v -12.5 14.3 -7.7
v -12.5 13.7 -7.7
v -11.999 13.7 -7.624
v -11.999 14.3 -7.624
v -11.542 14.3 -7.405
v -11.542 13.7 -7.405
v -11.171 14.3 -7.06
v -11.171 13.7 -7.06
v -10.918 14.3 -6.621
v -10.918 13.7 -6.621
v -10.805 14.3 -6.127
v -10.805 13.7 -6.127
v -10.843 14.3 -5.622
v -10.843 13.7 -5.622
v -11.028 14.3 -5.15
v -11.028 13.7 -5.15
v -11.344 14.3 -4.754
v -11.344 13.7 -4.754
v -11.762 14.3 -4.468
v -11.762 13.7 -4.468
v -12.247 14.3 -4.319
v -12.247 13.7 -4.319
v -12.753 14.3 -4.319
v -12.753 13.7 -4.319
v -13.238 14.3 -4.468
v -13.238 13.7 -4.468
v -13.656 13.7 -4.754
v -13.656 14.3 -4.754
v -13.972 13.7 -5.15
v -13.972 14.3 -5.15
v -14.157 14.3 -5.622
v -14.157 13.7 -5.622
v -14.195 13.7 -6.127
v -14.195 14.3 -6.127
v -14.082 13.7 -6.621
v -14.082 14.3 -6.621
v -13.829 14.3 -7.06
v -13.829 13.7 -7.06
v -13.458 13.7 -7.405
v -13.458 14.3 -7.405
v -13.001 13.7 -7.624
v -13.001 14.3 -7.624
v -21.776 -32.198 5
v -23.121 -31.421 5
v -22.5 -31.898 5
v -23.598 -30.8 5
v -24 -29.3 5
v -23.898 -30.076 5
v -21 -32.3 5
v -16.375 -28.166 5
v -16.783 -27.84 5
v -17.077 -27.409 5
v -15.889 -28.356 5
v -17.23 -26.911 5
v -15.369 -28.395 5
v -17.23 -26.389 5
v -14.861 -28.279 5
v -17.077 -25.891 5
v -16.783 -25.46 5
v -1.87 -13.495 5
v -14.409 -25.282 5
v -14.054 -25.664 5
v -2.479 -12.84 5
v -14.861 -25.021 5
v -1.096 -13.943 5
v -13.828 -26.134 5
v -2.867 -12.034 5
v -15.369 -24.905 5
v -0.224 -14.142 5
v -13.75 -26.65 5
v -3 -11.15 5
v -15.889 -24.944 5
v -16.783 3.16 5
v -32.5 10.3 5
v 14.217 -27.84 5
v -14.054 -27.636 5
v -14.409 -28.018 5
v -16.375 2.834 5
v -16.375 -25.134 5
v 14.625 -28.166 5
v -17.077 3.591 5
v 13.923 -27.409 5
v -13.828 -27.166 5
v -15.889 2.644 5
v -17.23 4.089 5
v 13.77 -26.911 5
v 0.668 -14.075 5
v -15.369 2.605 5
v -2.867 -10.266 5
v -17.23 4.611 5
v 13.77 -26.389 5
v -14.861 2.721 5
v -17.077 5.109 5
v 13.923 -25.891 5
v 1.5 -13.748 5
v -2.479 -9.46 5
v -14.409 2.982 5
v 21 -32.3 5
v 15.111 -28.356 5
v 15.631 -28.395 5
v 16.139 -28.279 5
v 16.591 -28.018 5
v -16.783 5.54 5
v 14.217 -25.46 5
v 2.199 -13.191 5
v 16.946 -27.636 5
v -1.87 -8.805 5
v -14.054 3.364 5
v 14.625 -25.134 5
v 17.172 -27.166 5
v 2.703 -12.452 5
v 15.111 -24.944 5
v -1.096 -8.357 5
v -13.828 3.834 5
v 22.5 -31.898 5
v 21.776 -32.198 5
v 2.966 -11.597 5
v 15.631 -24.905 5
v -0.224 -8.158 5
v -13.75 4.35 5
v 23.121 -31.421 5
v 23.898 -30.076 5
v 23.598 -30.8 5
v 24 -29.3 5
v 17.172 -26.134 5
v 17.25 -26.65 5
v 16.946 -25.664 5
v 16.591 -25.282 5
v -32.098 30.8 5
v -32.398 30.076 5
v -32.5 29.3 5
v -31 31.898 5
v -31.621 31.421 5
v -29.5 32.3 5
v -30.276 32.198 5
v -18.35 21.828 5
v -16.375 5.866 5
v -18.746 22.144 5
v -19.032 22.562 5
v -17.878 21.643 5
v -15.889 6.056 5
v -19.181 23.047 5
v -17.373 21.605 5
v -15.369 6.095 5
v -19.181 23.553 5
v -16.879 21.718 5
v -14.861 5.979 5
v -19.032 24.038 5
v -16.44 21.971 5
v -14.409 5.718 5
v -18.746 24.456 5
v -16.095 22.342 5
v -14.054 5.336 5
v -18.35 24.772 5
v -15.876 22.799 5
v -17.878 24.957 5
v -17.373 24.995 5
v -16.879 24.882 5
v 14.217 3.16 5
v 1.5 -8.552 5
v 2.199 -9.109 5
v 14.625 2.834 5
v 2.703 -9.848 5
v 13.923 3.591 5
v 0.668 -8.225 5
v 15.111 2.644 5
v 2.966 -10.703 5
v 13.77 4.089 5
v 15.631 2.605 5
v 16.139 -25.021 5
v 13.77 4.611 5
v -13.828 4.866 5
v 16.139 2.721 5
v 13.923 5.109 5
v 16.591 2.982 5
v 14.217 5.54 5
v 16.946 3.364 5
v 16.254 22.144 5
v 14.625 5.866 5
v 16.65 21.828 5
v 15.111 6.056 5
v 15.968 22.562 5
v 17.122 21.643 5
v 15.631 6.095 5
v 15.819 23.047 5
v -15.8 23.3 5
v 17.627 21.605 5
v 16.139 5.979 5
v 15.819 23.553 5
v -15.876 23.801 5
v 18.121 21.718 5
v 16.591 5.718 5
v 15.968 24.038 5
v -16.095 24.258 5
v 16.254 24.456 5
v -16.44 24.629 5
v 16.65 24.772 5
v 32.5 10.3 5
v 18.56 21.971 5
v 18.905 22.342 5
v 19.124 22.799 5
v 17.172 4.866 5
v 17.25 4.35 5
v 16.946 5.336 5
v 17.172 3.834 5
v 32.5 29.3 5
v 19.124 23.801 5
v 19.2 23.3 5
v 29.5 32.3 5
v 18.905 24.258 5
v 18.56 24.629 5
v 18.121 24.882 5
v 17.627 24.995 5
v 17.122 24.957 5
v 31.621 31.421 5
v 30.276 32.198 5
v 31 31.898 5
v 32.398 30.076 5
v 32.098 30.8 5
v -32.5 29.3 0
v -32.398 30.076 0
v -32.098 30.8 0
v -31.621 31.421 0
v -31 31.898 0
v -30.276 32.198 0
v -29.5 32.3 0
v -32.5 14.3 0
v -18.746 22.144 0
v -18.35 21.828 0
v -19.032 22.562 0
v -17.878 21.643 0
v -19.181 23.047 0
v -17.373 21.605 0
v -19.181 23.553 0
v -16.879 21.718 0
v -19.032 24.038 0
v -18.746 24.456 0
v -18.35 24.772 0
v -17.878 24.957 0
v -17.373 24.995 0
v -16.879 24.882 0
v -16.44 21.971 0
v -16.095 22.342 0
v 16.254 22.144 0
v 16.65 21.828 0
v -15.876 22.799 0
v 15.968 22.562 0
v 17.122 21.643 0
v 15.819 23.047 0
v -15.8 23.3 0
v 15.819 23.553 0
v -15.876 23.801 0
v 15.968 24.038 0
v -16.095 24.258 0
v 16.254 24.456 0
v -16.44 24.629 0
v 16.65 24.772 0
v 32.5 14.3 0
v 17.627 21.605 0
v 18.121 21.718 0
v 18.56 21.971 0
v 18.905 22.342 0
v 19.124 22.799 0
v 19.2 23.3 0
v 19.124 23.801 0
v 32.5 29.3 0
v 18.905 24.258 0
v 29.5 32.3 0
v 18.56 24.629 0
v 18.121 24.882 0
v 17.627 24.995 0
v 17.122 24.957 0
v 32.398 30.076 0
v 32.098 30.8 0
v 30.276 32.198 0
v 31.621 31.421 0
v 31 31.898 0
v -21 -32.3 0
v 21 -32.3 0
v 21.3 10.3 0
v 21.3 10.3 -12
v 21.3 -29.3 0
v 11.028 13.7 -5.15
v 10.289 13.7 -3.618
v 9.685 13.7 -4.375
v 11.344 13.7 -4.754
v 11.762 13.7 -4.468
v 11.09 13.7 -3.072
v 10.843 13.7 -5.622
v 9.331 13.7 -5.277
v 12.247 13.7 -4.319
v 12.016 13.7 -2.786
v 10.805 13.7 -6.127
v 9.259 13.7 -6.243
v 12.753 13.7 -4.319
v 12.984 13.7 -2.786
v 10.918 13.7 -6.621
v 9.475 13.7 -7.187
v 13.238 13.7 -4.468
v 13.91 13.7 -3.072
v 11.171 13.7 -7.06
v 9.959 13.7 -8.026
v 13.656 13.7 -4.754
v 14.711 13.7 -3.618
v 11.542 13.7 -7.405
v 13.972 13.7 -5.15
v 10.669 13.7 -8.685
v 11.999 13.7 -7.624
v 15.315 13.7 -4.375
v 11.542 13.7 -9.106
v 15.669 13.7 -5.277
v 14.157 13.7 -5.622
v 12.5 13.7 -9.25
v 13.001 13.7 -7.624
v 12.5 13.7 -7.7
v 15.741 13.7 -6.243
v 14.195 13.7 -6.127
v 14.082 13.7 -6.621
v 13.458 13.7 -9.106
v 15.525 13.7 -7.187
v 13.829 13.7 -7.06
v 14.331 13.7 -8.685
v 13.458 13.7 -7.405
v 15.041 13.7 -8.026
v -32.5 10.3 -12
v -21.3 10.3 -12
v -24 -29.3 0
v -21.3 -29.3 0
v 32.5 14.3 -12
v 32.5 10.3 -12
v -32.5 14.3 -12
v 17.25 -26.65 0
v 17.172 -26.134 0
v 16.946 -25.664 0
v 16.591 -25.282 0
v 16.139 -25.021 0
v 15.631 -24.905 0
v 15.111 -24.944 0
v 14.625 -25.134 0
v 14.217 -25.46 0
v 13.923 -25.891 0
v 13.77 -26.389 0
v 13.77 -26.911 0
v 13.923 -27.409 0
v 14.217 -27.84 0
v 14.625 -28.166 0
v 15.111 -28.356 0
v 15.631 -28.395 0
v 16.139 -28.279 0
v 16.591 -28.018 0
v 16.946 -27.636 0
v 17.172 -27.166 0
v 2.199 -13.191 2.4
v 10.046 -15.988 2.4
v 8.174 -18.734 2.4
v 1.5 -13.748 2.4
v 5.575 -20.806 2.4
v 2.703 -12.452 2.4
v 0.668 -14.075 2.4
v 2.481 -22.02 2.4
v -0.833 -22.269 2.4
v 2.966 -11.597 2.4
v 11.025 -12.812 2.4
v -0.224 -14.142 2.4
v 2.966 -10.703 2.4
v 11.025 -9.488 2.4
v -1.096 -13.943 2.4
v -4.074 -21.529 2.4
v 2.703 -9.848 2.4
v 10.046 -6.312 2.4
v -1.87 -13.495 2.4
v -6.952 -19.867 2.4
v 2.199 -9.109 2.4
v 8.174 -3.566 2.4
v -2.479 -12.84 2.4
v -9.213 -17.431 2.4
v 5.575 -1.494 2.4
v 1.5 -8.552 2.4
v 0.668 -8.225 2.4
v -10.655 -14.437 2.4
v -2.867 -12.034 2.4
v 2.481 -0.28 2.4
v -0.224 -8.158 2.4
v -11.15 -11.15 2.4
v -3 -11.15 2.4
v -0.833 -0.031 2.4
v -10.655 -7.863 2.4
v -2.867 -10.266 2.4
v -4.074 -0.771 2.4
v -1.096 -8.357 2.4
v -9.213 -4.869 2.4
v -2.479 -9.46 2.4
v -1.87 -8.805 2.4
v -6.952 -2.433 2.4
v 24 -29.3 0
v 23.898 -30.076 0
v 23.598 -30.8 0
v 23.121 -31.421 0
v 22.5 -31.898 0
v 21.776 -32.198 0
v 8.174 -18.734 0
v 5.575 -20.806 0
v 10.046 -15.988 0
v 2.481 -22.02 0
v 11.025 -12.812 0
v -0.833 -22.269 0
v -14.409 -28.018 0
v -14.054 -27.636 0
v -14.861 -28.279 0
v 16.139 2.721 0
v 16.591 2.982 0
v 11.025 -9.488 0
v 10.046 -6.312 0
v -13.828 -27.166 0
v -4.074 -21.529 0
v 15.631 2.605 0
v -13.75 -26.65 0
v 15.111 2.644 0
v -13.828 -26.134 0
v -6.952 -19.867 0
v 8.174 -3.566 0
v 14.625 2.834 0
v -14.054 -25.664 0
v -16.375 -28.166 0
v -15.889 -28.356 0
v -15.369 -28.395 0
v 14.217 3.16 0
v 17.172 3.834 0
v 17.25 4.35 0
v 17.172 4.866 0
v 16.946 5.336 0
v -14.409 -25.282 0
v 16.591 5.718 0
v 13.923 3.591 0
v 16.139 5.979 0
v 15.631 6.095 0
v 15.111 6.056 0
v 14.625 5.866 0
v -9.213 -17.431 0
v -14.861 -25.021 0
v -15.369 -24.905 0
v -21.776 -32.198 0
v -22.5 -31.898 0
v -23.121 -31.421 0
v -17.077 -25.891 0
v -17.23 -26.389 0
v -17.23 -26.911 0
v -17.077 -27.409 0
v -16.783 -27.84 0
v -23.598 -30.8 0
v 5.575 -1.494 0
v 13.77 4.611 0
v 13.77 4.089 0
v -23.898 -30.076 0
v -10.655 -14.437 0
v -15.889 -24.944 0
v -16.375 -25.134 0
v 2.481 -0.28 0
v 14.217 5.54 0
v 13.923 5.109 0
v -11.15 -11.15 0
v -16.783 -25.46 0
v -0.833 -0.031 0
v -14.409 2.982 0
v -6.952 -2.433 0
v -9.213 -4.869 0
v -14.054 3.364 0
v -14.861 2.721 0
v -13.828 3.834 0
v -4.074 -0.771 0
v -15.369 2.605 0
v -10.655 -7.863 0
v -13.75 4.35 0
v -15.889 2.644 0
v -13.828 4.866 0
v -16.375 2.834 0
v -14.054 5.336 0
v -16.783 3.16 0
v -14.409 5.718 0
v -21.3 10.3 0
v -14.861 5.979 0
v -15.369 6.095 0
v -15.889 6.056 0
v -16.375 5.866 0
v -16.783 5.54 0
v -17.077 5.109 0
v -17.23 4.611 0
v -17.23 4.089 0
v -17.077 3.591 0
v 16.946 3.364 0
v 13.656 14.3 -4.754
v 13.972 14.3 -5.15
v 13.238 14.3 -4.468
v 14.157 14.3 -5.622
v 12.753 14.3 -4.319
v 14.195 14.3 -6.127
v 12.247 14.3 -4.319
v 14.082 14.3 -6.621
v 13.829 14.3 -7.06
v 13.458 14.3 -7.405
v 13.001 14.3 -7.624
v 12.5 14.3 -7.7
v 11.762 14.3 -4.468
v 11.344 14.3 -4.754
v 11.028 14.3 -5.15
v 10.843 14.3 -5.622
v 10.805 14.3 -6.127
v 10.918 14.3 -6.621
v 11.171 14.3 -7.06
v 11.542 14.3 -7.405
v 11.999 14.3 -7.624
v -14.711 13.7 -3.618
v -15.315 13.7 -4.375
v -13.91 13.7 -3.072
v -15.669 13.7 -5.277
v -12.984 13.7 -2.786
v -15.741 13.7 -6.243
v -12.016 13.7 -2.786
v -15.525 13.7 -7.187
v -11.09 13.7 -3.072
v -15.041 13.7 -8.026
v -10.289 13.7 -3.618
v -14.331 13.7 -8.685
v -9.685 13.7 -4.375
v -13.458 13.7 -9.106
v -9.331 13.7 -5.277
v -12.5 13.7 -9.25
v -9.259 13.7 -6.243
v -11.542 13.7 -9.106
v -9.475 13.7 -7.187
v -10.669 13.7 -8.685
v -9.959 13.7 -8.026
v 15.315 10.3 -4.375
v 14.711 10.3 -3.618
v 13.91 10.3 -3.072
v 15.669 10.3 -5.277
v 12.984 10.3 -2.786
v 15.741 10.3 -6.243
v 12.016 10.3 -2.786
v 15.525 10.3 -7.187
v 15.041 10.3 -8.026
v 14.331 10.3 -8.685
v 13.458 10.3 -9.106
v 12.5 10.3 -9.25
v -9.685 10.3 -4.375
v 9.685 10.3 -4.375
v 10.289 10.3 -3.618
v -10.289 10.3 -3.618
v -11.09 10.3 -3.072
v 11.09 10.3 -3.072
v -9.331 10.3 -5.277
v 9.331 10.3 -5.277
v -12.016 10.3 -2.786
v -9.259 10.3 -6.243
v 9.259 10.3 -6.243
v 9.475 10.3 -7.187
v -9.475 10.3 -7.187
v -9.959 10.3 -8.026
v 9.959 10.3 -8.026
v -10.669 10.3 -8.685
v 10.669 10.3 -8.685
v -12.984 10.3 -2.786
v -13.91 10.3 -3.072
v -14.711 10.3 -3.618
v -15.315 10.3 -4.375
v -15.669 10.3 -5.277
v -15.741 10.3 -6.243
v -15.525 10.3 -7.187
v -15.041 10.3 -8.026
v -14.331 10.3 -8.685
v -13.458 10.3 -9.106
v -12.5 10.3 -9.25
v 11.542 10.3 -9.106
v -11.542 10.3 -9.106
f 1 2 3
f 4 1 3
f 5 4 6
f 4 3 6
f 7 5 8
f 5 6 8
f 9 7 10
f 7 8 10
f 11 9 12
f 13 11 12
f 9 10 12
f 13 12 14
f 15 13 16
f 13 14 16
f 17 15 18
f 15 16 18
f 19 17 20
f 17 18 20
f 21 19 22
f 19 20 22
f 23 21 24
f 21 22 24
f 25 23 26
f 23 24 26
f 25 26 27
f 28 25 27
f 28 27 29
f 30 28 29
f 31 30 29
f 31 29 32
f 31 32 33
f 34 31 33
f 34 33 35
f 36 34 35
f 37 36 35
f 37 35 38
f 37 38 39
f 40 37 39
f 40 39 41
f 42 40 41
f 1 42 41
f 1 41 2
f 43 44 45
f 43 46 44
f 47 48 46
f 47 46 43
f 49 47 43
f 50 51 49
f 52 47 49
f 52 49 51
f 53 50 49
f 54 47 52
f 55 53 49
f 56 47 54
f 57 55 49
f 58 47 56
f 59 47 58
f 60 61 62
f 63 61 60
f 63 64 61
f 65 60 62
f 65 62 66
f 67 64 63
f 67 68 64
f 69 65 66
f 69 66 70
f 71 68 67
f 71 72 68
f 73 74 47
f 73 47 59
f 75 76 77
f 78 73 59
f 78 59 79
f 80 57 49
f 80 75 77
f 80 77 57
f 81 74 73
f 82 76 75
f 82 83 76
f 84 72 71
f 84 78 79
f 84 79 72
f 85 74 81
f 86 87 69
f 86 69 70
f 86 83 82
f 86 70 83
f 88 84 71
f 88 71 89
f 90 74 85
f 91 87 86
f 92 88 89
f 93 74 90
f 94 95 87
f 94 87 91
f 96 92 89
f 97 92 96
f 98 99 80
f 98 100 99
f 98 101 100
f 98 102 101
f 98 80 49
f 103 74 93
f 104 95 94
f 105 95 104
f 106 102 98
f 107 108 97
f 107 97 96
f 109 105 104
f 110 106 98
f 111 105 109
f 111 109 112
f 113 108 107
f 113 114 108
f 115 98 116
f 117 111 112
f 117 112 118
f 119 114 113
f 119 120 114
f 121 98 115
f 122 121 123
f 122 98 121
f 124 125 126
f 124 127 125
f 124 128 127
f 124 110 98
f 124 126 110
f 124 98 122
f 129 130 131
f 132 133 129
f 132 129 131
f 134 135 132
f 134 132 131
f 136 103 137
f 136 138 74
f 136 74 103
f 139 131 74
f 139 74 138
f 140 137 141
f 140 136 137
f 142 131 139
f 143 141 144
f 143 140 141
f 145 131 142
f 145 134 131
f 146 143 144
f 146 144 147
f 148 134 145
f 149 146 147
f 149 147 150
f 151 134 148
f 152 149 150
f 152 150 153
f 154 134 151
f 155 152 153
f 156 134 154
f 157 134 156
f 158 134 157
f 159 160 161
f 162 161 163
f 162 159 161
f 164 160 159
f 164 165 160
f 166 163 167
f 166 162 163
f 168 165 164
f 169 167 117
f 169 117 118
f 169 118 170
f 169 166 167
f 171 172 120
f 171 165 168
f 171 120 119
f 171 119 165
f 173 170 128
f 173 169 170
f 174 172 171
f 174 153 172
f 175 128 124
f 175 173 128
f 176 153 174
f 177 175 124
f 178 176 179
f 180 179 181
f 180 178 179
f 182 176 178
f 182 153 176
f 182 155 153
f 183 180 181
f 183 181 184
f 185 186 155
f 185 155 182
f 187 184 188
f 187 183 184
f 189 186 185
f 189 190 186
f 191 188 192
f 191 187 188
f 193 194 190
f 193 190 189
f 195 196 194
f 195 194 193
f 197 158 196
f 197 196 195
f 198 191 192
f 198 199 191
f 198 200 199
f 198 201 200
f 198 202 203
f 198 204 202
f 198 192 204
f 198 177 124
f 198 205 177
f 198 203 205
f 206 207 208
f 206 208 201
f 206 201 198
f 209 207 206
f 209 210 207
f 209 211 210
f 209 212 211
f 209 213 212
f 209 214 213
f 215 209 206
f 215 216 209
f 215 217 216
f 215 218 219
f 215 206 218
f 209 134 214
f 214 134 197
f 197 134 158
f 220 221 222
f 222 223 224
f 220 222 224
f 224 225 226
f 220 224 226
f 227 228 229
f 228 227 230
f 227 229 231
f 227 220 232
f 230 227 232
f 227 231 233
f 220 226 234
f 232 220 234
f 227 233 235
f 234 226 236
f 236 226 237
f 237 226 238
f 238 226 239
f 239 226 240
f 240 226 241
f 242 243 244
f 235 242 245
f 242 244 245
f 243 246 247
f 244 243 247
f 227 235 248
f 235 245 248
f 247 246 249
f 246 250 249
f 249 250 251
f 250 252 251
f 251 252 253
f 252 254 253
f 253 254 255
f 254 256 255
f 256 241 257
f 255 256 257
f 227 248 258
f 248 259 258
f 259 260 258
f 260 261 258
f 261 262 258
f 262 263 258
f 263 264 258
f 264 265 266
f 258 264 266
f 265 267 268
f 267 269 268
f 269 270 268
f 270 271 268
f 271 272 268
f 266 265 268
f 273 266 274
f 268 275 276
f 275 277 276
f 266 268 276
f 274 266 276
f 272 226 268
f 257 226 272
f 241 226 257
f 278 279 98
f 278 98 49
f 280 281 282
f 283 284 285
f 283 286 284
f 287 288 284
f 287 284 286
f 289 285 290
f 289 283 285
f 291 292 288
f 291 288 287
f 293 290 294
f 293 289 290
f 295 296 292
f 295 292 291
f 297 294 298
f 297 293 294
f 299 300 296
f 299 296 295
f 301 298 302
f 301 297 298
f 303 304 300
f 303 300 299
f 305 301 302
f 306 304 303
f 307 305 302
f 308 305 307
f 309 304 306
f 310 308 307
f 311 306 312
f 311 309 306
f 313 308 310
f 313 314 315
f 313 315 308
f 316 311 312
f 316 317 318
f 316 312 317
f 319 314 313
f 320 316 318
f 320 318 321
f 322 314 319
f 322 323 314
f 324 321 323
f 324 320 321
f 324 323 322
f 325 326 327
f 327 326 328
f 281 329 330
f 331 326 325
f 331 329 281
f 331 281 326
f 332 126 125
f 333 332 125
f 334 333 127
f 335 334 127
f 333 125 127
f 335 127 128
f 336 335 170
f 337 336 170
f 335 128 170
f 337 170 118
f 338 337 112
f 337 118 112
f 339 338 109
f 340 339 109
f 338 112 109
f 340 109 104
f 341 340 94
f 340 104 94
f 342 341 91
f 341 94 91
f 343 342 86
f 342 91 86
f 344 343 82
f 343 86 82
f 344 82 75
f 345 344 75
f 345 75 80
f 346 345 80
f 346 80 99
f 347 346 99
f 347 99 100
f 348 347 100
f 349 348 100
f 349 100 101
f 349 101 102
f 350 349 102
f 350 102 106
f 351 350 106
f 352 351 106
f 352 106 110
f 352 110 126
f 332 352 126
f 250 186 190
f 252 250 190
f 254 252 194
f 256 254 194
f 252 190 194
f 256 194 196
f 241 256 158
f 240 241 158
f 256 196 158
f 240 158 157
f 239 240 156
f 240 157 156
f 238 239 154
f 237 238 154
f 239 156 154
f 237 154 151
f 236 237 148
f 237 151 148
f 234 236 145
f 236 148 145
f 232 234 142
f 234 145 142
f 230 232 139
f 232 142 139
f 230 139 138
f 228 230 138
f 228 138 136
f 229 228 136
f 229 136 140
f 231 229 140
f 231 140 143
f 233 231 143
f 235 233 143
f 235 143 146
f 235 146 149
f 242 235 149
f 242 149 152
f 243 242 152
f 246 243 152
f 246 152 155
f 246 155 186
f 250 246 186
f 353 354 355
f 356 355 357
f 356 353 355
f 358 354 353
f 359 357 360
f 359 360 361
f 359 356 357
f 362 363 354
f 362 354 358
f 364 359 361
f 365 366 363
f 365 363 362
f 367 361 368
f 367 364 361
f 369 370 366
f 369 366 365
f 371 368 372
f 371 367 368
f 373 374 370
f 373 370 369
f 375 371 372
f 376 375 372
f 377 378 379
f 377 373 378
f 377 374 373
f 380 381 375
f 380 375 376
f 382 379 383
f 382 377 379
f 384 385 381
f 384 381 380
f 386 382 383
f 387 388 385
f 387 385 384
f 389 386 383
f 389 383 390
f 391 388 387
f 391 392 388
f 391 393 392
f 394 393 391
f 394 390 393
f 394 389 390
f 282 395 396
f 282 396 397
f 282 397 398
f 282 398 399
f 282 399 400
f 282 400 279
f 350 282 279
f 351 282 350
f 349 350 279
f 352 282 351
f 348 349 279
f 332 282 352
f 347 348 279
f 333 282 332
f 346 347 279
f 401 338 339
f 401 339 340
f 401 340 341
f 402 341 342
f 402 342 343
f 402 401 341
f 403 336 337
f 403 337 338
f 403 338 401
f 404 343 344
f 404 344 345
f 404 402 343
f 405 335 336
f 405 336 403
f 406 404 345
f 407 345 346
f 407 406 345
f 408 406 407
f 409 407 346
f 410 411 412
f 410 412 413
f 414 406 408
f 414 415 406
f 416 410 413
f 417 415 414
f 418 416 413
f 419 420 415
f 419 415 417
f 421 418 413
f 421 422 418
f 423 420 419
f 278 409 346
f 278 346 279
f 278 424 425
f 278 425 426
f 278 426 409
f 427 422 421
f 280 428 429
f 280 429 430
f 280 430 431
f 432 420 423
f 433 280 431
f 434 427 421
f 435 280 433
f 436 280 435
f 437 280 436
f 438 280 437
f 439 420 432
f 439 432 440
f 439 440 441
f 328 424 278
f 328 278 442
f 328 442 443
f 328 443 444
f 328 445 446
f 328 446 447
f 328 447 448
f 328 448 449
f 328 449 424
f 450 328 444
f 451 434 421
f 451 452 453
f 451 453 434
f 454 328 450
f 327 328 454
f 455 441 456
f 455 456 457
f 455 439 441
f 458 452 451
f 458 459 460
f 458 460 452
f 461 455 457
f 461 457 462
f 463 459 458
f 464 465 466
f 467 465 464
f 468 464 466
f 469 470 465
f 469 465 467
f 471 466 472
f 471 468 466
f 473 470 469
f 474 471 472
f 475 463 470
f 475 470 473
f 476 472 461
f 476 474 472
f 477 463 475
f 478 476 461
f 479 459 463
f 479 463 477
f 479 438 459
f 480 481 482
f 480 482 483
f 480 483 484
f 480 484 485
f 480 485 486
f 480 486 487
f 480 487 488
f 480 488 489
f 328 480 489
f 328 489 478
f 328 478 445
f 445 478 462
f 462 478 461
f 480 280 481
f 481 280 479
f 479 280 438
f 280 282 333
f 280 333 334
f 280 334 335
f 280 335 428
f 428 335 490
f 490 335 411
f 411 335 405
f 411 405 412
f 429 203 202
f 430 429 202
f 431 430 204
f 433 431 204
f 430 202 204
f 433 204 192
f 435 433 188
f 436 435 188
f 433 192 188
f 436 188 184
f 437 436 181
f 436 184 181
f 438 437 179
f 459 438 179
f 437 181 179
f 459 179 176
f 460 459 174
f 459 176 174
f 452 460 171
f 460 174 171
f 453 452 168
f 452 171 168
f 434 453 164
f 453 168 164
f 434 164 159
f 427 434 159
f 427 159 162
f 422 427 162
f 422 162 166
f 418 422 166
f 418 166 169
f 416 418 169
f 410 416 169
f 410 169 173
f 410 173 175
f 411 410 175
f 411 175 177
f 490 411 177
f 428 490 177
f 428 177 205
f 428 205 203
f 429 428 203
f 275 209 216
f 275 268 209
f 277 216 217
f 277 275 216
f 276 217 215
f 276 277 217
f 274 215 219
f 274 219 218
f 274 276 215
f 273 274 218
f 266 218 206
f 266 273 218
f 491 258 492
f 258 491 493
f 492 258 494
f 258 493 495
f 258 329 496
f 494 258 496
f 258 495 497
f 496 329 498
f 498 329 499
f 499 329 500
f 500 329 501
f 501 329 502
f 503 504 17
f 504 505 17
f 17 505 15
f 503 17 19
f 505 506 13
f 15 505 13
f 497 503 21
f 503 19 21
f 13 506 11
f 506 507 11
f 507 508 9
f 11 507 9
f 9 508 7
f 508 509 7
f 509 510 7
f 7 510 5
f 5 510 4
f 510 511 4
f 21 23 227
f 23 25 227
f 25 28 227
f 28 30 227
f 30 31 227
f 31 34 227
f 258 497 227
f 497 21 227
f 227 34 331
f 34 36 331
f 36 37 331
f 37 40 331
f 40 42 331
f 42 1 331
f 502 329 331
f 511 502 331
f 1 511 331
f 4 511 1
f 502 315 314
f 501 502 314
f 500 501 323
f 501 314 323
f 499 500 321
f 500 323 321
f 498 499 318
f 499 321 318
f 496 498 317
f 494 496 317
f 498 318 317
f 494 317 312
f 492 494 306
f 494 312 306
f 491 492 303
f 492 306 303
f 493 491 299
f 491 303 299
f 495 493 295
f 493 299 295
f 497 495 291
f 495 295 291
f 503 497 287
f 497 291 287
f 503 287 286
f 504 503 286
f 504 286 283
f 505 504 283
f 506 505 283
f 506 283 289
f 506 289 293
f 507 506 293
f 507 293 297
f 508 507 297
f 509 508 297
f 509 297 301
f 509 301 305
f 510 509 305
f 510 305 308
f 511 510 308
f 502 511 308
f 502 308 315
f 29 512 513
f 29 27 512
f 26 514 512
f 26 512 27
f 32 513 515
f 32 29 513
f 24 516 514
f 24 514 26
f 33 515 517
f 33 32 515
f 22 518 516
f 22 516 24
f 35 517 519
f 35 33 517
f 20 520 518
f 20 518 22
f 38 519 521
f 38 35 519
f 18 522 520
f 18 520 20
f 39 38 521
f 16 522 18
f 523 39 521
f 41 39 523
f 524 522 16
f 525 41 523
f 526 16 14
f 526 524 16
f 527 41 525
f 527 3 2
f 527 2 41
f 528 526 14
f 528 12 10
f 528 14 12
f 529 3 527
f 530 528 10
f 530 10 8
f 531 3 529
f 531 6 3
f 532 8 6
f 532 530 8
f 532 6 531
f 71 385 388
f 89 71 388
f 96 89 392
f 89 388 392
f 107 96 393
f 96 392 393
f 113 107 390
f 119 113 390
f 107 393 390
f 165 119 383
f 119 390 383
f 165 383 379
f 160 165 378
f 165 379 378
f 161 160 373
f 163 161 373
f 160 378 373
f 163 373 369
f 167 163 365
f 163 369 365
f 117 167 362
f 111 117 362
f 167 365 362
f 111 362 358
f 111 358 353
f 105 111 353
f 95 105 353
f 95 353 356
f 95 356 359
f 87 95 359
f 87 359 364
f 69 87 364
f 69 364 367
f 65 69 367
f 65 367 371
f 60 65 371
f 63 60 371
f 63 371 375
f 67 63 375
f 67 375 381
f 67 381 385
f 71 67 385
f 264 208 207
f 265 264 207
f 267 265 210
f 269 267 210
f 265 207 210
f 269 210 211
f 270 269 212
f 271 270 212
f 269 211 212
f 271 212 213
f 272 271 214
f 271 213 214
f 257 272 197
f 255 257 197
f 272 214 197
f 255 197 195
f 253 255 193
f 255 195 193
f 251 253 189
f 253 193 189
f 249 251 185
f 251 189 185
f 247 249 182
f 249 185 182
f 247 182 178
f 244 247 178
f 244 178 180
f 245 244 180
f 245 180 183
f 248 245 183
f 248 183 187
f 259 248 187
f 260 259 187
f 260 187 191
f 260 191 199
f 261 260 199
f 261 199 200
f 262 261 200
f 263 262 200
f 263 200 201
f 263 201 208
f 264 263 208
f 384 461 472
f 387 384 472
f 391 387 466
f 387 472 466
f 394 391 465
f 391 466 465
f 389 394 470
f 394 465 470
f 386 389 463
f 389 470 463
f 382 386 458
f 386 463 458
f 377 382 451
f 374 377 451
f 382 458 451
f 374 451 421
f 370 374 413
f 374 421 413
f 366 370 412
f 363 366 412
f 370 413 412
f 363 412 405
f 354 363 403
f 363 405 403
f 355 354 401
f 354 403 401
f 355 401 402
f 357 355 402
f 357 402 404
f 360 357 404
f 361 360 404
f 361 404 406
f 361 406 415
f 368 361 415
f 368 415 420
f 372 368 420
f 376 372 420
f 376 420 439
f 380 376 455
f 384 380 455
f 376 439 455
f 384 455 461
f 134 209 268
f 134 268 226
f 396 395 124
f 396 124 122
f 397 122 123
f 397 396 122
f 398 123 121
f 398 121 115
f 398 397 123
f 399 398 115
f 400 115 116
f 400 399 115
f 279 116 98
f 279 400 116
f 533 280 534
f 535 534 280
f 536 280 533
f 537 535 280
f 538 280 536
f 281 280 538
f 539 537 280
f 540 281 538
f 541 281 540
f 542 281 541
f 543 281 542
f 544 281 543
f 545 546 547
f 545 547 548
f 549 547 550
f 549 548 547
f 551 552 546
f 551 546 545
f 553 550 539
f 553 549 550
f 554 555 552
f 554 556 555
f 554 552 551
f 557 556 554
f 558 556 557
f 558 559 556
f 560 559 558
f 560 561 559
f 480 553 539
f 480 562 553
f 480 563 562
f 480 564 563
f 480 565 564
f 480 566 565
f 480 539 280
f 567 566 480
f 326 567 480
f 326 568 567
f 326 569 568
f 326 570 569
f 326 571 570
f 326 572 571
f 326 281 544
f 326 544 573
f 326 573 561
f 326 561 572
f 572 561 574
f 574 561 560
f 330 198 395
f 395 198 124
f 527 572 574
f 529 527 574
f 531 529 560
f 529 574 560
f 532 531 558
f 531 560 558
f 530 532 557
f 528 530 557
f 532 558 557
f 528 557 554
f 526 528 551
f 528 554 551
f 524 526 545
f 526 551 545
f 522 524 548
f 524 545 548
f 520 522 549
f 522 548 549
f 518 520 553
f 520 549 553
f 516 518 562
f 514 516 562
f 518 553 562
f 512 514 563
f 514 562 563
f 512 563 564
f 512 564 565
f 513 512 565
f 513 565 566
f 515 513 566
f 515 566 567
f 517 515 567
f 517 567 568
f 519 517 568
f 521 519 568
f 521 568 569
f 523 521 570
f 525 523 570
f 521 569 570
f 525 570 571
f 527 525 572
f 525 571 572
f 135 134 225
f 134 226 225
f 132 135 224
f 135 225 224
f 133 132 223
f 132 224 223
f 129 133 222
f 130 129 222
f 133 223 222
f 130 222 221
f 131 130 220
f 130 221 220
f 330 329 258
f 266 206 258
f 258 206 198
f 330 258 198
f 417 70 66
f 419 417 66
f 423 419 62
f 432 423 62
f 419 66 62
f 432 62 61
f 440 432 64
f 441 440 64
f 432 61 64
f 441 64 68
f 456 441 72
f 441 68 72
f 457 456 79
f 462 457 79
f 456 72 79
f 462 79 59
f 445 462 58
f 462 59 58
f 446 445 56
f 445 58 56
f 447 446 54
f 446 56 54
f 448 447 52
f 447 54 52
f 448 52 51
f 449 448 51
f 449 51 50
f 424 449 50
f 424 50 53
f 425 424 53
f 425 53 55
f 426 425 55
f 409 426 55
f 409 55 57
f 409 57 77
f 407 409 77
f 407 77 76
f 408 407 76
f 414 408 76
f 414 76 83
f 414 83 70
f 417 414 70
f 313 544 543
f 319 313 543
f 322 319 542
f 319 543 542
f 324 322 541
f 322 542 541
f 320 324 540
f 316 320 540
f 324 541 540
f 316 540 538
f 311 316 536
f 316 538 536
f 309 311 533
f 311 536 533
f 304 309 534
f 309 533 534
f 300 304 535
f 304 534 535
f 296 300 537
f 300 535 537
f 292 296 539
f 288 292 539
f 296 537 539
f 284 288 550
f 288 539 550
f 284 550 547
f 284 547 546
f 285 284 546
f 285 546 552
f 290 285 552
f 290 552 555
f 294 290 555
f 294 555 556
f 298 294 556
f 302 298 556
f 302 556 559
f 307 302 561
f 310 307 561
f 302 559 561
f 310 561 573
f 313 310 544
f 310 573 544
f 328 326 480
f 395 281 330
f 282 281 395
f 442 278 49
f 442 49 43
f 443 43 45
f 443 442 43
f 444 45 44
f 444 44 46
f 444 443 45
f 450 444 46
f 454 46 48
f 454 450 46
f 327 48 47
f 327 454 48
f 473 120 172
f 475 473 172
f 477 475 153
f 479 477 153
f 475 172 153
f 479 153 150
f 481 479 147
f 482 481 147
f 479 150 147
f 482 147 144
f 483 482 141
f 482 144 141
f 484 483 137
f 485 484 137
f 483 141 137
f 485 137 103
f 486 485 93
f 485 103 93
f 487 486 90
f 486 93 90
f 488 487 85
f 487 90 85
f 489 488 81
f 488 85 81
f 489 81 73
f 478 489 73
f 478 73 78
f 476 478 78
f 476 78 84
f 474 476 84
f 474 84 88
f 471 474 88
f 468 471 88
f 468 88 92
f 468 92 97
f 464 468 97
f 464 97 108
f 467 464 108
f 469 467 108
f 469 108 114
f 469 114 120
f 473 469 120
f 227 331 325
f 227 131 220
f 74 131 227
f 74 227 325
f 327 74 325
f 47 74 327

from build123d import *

# Parameters (mm, degrees)
AUFSATZ_LINEAR_AUSTRAGEN1_DEPTH  = 5
SKIZZE2_R                        = 1.75
SKIZZE2_R_2                      = 1.7
SCHNITT_LINEAR_AUSTRAGEN1_DEPTH  = 41.549845869
SKIZZE3_R                        = 11.15
SCHNITT_LINEAR_AUSTRAGEN2_DEPTH  = 2.4
SKIZZE4_R                        = 3
SCHNITT_LINEAR_AUSTRAGEN3_DEPTH  = 41.324310285
SKIZZE9_W                        = 65
SKIZZE9_H                        = 4
AUFSATZ_LINEAR_AUSTRAGEN6_DEPTH  = 12
SKIZZE13_W                       = 8.5
SKIZZE13_H                       = 5
AUFSATZ_LINEAR_AUSTRAGEN8_DEPTH  = 4
AUFSATZ_LINEAR_AUSTRAGEN7_DEPTH  = 2.7
SKIZZE14_R                       = 1.7
SCHNITT_LINEAR_AUSTRAGEN4_DEPTH  = 55.909106713
SKIZZE15_R                       = 3.25
SCHNITT_LINEAR_AUSTRAGEN5_DEPTH  = 3.4
AUFSATZ_LINEAR_AUSTRAGEN9_REACH  = 50.873
AUFSATZ_LINEAR_AUSTRAGEN10_DEPTH = 5
VERRUNDUNG4_R                    = 3
VERRUNDUNG4_OF_SPIEGELN5_R       = 3


with BuildPart() as part:
    # Skizze1 → Aufsatz-Linear austragen1 (new body)
    with BuildSketch(Plane.XY):
        with BuildLine():
            Line((-21, 32.3), (21, 32.3))
            ThreePointArc((21, 32.3), (23.121320344, 31.421320344), (24, 29.3))
            Line((24, 29.3), (24, -29.3))
            ThreePointArc((24, -29.3), (23.121320344, -31.421320344), (21, -32.3))
            Line((21, -32.3), (-21, -32.3))
            ThreePointArc((-21, -32.3), (-23.121320344, -31.421320344), (-24, -29.3))
            Line((-24, -29.3), (-24, 29.3))
            ThreePointArc((-24, 29.3), (-23.121320344, 31.421320344), (-21, 32.3))
        make_face()
    extrude(amount=AUFSATZ_LINEAR_AUSTRAGEN1_DEPTH)

    # Skizze2 → Schnitt-Linear austragen1 (cut, through all)
    with BuildSketch(Plane.XY.offset(5)):
        with Locations((-15.5, -26.65)):
            Circle(SKIZZE2_R)
        with Locations((15.5, -26.65)):
            Circle(SKIZZE2_R)
        with Locations((15.5, 4.35)):
            Circle(SKIZZE2_R)
        with Locations((-15.5, 4.35)):
            Circle(SKIZZE2_R)
        with Locations((-17.5, 23.3)):
            Circle(SKIZZE2_R_2)
        with Locations((17.5, 23.3)):
            Circle(SKIZZE2_R_2)
    extrude(amount=-SCHNITT_LINEAR_AUSTRAGEN1_DEPTH, mode=Mode.SUBTRACT)

    # Skizze3 → Schnitt-Linear austragen2 (cut)
    with BuildSketch(Plane(origin=(0, 0, 0), x_dir=(-1, 0, 0), z_dir=(0, 0, -1))):
        with Locations((0, -11.15)):
            Circle(SKIZZE3_R)
    extrude(amount=-SCHNITT_LINEAR_AUSTRAGEN2_DEPTH, mode=Mode.SUBTRACT)

    # Skizze4 → Schnitt-Linear austragen3 (cut, through all)
    with BuildSketch(Plane(origin=(0, 0, 2.4), x_dir=(-1, 0, 0), z_dir=(0, 0, -1))):
        with Locations((0, -11.15)):
            Circle(SKIZZE4_R)
    extrude(amount=-SCHNITT_LINEAR_AUSTRAGEN3_DEPTH, mode=Mode.SUBTRACT)

    # Skizze9 → Aufsatz-Linear austragen6 (add)
    with BuildSketch(Plane(origin=(0, 0, 0), x_dir=(-1, 0, 0), z_dir=(0, 0, -1))):
        with Locations((0, 12.3)):
            Rectangle(SKIZZE9_W, SKIZZE9_H)
    extrude(amount=AUFSATZ_LINEAR_AUSTRAGEN6_DEPTH)

    # Skizze13 → Aufsatz-Linear austragen8 (add)
    with BuildSketch(Plane(origin=(0, 14.3, 0), x_dir=(1, 0, 0), z_dir=(0, 1, 0))):
        with Locations((28.25, -2.5)):
            Rectangle(SKIZZE13_W, SKIZZE13_H)
    aufsatz_linear_austragen8 = extrude(amount=-AUFSATZ_LINEAR_AUSTRAGEN8_DEPTH)

    # Skizze11 → Aufsatz-Linear austragen7 (add)
    with BuildSketch(Plane(origin=(24, 0, 0), x_dir=(0, 0, -1), z_dir=(1, 0, 0))):
        Polygon((12, 10.3), (0, -29.3), (0, 10.3), align=None)
    aufsatz_linear_austragen7 = extrude(amount=-AUFSATZ_LINEAR_AUSTRAGEN7_DEPTH)

    # Spiegeln4: Aufsatz-Linear austragen8, Aufsatz-Linear austragen7 across plane
    add(aufsatz_linear_austragen8.mirror(Plane.ZY))
    add(aufsatz_linear_austragen7.mirror(Plane.ZY))

    # Skizze14 → Schnitt-Linear austragen4 (cut, through all)
    with BuildSketch(Plane.XZ.offset(-10.3)):
        with Locations(Location((12.5, -6, 0), (0, 0, 270))):
            Circle(SKIZZE14_R)
        with Locations(Location((-12.5, -6, 0), (0, 0, 270))):
            Circle(SKIZZE14_R)
    extrude(amount=-SCHNITT_LINEAR_AUSTRAGEN4_DEPTH, mode=Mode.SUBTRACT)

    # Skizze15 → Schnitt-Linear austragen5 (cut)
    with BuildSketch(Plane(origin=(0, 10.3, 0), x_dir=(-1, 0, 0), z_dir=(0, -1, 0))):
        with Locations(Location((12.5, 6, 0), (0, 0, 90))):
            Circle(SKIZZE15_R)
        with Locations(Location((-12.5, 6, 0), (0, 0, 90))):
            Circle(SKIZZE15_R)
    extrude(amount=-SCHNITT_LINEAR_AUSTRAGEN5_DEPTH, mode=Mode.SUBTRACT)

    # Aufsatz-Linear austragen9: up to this plane
    aufsatz_linear_austragen9_end = Plane(origin=(21.3, 10.3, -12), z_dir=(0, -0.29000739528287084, -0.9570244044334736))
    # Skizze16 → Aufsatz-Linear austragen9 (add, up to the surface)
    with BuildSketch(Plane.XY.offset(5), mode=Mode.PRIVATE) as aufsatz_linear_austragen9_sk1:
        Polygon((32.5, 10.3), (24, -29.3), (24, 10.3), align=None)
    aufsatz_linear_austragen9_tool1 = split(extrude(aufsatz_linear_austragen9_sk1.sketch, amount=-AUFSATZ_LINEAR_AUSTRAGEN9_REACH, mode=Mode.PRIVATE), bisect_by=aufsatz_linear_austragen9_end, keep=Keep.BOTH, mode=Mode.PRIVATE)
    aufsatz_linear_austragen9 = aufsatz_linear_austragen9_tool1.solids().sort_by_distance((26.833333, -2.9, 5))[0]
    add(aufsatz_linear_austragen9)

    # Skizze17 → Aufsatz-Linear austragen10 (add)
    with BuildSketch(Plane.XY.offset(5)):
        Polygon((21, 32.3), (32.5, 32.3), (32.5, 14.3), (24, 14.3), align=None)
    aufsatz_linear_austragen10 = extrude(amount=-AUFSATZ_LINEAR_AUSTRAGEN10_DEPTH)

    # Verrundung4
    verrundung4_edges = [part.edges().sort_by_distance(p)[0] for p in [
        (32.5, 32.3, 2.5),
    ]]
    fillet(verrundung4_edges, radius=VERRUNDUNG4_R)

    # Spiegeln5: Aufsatz-Linear austragen9, Aufsatz-Linear austragen10 across plane
    add(aufsatz_linear_austragen9.mirror(Plane.ZY))
    add(aufsatz_linear_austragen10.mirror(Plane.ZY))

    # Verrundung4 of Spiegeln5
    verrundung4_of_spiegeln5_edges = [part.edges().sort_by_distance(p)[0] for p in [
        (-32.5, 32.3, 2.5),
    ]]
    fillet(verrundung4_of_spiegeln5_edges, radius=VERRUNDUNG4_OF_SPIEGELN5_R)


solid = part.part
